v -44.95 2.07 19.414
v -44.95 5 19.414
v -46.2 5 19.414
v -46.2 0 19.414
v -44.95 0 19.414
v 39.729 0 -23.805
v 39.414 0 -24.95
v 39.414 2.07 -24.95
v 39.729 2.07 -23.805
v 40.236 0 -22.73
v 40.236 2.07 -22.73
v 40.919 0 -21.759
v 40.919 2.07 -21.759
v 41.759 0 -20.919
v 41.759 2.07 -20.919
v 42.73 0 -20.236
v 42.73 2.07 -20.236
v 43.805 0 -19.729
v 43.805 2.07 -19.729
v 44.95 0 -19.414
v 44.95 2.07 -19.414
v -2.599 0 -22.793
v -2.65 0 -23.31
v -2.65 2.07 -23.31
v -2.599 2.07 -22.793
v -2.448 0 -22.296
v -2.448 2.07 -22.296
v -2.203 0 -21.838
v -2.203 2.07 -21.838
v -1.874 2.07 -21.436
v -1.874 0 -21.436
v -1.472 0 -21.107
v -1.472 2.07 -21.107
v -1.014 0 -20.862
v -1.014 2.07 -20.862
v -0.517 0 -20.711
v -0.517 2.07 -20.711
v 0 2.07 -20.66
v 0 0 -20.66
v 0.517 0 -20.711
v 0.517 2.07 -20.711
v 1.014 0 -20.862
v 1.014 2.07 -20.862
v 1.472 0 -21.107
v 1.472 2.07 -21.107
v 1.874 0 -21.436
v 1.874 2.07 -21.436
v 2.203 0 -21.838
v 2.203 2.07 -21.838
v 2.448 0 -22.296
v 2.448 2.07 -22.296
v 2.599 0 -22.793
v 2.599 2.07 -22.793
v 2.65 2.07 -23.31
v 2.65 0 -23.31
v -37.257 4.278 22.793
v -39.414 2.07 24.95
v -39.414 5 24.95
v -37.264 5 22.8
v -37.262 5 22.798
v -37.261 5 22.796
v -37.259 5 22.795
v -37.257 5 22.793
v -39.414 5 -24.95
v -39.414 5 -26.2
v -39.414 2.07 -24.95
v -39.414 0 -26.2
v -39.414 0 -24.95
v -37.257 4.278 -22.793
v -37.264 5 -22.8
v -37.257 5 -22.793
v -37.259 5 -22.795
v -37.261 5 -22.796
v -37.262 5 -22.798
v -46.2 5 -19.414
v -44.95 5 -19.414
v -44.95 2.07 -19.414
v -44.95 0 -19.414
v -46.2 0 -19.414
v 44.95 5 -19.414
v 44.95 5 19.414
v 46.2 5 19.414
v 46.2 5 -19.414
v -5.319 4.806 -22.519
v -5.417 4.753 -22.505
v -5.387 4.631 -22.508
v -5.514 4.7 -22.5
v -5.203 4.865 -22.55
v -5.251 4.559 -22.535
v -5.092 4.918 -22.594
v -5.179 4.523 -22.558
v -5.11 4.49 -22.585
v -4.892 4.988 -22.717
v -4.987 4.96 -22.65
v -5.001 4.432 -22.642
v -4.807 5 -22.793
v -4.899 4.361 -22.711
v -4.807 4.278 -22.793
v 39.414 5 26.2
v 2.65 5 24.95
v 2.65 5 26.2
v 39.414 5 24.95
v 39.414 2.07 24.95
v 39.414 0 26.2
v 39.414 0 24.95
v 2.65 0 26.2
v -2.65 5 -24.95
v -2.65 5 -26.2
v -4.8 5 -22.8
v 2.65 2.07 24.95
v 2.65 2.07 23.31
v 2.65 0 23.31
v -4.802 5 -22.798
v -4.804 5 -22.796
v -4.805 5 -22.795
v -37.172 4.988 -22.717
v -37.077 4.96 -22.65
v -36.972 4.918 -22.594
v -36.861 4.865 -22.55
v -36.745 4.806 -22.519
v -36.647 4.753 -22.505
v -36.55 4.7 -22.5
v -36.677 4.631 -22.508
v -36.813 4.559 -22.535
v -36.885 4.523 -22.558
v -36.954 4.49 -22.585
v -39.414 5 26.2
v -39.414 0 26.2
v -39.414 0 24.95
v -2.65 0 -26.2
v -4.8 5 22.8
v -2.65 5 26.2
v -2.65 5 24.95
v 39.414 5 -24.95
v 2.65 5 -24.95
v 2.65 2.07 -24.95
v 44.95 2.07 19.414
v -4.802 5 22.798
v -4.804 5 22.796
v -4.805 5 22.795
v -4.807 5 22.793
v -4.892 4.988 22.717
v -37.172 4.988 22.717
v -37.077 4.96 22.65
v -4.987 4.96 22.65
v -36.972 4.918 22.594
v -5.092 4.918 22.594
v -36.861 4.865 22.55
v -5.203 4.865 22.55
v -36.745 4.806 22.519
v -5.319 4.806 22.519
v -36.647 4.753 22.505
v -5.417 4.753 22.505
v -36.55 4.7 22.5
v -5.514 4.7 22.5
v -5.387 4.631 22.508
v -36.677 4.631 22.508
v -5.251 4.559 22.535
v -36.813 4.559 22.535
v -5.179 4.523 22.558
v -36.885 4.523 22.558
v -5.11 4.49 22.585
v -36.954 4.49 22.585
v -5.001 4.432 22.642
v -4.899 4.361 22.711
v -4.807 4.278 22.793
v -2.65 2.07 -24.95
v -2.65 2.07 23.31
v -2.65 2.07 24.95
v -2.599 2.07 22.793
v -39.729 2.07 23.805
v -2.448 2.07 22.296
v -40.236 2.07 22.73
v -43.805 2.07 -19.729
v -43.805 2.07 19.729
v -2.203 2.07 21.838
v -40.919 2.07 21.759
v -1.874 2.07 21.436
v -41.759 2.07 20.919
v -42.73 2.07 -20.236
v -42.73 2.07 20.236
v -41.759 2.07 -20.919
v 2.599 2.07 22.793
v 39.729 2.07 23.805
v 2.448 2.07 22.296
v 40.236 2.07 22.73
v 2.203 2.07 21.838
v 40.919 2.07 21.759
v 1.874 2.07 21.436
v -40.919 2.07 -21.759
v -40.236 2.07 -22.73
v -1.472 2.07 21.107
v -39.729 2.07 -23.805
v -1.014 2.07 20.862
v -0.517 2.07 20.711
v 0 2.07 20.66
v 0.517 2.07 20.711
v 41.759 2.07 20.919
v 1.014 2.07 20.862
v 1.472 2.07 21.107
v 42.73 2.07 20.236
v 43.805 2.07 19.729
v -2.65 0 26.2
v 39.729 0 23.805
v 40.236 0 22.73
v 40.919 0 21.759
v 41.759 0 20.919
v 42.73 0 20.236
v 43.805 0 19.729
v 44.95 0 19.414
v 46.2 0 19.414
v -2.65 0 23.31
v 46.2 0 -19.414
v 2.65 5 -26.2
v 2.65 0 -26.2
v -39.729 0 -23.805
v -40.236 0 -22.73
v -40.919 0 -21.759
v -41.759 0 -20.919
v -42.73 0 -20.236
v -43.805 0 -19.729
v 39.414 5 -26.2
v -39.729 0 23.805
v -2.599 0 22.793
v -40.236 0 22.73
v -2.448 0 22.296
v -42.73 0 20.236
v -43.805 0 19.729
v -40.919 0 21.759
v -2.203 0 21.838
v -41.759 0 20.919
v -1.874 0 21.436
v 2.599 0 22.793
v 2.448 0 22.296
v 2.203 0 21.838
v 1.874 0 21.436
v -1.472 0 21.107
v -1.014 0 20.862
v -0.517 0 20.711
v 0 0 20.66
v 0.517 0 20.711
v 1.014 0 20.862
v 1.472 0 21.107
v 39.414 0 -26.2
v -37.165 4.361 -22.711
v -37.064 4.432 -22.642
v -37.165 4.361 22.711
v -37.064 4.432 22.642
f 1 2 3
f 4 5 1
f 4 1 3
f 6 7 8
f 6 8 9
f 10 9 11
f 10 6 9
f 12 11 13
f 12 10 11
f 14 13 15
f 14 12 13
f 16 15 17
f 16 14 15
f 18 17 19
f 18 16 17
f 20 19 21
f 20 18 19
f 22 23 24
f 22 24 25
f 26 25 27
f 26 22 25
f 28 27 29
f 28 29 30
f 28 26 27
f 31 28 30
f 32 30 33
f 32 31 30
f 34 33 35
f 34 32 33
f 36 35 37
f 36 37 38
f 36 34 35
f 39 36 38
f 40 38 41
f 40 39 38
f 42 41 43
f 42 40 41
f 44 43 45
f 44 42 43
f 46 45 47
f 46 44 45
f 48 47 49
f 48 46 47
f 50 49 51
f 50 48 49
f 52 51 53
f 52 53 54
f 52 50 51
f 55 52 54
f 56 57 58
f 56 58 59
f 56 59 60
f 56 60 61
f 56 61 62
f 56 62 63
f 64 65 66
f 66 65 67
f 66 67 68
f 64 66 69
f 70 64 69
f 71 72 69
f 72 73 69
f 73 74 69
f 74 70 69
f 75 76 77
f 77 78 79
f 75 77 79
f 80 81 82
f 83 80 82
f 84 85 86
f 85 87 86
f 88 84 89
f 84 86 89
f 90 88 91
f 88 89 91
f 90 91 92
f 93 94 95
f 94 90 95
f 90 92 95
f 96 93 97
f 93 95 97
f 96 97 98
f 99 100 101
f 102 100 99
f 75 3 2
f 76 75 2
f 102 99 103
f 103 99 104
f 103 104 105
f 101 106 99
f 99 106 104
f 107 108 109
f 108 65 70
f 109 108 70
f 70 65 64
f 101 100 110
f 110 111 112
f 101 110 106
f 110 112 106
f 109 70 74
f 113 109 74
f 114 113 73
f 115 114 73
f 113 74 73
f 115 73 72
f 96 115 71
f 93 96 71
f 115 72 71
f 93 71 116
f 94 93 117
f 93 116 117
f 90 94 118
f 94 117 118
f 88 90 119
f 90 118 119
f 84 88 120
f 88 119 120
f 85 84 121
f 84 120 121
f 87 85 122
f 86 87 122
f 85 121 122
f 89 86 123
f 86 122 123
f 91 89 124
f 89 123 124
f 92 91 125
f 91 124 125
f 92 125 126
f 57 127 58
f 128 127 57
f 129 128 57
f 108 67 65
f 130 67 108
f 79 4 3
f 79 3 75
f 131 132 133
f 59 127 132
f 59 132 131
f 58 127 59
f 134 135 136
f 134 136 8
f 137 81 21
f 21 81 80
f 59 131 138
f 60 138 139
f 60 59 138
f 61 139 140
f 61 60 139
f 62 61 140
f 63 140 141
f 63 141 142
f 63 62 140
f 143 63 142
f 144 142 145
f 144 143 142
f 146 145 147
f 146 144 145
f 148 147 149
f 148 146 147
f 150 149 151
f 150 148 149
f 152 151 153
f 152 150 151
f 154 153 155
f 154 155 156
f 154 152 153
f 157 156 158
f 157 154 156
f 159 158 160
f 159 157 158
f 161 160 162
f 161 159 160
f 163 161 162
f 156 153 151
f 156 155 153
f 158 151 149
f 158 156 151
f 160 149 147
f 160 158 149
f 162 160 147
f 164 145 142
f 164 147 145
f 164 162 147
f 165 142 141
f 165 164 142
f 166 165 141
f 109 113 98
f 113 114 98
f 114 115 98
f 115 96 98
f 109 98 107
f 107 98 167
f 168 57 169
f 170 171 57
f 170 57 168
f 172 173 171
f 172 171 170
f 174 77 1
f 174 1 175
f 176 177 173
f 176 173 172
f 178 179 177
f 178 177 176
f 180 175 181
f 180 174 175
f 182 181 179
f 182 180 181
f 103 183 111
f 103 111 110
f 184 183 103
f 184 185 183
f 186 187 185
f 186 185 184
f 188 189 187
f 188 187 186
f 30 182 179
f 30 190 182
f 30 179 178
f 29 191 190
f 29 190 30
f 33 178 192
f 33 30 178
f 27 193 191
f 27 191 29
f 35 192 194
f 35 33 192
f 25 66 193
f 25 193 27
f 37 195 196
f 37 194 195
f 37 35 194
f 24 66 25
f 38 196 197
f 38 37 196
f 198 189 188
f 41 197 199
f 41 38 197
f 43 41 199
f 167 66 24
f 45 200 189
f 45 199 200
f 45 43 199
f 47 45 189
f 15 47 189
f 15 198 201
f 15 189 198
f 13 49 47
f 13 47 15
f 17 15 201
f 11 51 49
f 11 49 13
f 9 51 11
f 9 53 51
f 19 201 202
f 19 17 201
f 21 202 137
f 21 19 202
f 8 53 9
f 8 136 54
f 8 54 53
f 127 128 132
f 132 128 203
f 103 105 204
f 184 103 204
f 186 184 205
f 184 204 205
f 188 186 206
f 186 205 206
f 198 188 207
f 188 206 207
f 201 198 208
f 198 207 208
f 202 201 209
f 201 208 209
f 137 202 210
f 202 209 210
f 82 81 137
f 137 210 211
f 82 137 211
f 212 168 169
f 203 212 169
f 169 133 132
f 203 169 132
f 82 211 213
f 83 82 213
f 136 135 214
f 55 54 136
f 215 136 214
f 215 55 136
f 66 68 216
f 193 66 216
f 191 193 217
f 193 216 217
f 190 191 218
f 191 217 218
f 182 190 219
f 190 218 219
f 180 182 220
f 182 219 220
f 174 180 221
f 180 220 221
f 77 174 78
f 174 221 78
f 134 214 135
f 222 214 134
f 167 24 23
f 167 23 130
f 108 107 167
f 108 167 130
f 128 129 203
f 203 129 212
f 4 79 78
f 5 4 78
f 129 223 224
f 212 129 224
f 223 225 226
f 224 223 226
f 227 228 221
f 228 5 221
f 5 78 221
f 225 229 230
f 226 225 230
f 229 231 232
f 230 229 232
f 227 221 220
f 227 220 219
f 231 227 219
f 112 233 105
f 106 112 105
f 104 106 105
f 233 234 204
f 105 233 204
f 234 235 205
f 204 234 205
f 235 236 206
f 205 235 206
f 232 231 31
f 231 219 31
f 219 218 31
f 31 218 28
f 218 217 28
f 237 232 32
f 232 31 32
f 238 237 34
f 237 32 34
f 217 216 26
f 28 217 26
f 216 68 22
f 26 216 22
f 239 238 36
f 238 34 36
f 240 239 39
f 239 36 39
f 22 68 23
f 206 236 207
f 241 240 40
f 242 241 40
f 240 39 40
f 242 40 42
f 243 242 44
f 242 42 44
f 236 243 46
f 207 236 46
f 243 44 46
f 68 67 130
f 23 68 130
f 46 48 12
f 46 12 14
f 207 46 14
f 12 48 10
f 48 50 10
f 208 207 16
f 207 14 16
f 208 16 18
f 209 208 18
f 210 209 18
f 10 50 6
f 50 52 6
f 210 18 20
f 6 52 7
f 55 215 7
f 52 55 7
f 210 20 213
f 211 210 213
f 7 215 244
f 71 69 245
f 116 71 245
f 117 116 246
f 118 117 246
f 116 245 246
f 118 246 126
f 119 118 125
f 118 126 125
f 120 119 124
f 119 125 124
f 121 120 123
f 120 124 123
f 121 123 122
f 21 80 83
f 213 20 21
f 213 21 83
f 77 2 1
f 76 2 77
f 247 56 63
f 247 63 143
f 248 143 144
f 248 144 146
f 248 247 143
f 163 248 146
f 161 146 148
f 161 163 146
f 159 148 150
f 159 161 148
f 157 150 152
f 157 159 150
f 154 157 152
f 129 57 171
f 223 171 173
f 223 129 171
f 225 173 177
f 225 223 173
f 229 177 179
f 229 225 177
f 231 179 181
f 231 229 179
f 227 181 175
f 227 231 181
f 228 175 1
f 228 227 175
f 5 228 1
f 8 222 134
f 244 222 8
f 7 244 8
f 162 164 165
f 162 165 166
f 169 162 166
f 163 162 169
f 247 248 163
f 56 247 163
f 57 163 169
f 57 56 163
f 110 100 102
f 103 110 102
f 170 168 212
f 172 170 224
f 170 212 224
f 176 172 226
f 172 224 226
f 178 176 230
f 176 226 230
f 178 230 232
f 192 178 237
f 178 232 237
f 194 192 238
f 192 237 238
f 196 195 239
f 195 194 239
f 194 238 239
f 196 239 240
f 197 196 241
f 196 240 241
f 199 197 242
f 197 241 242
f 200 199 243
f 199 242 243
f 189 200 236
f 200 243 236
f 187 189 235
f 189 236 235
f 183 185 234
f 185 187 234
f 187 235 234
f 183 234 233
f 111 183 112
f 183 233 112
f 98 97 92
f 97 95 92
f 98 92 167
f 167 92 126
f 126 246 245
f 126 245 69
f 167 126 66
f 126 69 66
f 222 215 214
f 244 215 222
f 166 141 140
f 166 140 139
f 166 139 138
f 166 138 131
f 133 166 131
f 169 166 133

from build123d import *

# Parameters (mm, degrees)
CROQUIS1_W              = 92.4
CROQUIS1_H              = 52.4
SALIENTE_EXTRUIR1_DEPTH = 5
CROQUIS2_W              = 89.9
CROQUIS2_H              = 49.9
CORTAR_EXTRUIR1_DEPTH   = 2.93
CORTAR_EXTRUIR2_START   = -2.07
CORTAR_EXTRUIR2_DEPTH   = 5
CORTAR_EXTRUIR3_START   = -2.07
CORTAR_EXTRUIR3_DEPTH   = 5
SIMETR_A2_START         = -2.07
SIMETR_A2_COPY_1_DEPTH  = 5
SALIENTE_EXTRUIR3_START = -36.764169
SALIENTE_EXTRUIR3_DEPTH = 36.764169
CORTAR_EXTRUIR5_REACH   = 55.193


with BuildPart() as part:
    # Croquis1 → Saliente-Extruir1 (new body)
    with BuildSketch(Plane(origin=(0, 0, 0), x_dir=(1, 0, 0), z_dir=(0, 1, 0))):
        Rectangle(CROQUIS1_W, CROQUIS1_H)
    extrude(amount=SALIENTE_EXTRUIR1_DEPTH)

    # Croquis2 → Cortar-Extruir1 (cut)
    with BuildSketch(Plane(origin=(0, 5, 0), x_dir=(1, 0, 0), z_dir=(0, 1, 0))):
        Rectangle(CROQUIS2_W, CROQUIS2_H)
    extrude(amount=-CORTAR_EXTRUIR1_DEPTH, mode=Mode.SUBTRACT)

    # Croquis3 → Cortar-Extruir2 (cut)
    with BuildSketch(Plane(origin=(0, 2.07, 0), x_dir=(1, 0, 0), z_dir=(0, 1, 0)).offset(CORTAR_EXTRUIR2_START)):
        with BuildLine():
            Line((2.65, -23.31), (2.65, -26.2))
            Line((2.65, -26.2), (-2.65, -26.2))
            Line((-2.65, -26.2), (-2.65, -23.31))
            ThreePointArc((-2.65, -23.31), (0, -20.66), (2.65, -23.31))
        make_face()
    cortar_extruir2 = extrude(amount=CORTAR_EXTRUIR2_DEPTH, mode=Mode.SUBTRACT)

    # Croquis4 → Cortar-Extruir3 (cut)
    with BuildSketch(Plane(origin=(0, 2.07, 0), x_dir=(1, 0, 0), z_dir=(0, 1, 0)).offset(CORTAR_EXTRUIR3_START)):
        with BuildLine():
            Line((-46.2, -19.414169174), (-46.2, -26.2))
            Line((-46.2, -26.2), (-39.414169174, -26.2))
            Line((-39.414169174, -26.2), (-39.414169174, -24.95))
            ThreePointArc((-39.414169174, -24.95), (-41.32096321, -21.32096321), (-44.95, -19.414169174))
            Line((-44.95, -19.414169174), (-46.2, -19.414169174))
        make_face()
    cortar_extruir3 = extrude(amount=CORTAR_EXTRUIR3_DEPTH, mode=Mode.SUBTRACT)

    # Simetría1: Cortar-Extruir3 across plane
    add(cortar_extruir3.mirror(Plane(origin=(0, 0, 0), x_dir=(0, 0, 1), z_dir=(1, 0, 0))), mode=Mode.SUBTRACT)

    # Simetría2: Cortar-Extruir3 across plane
    add(cortar_extruir3.mirror(Plane.XY), mode=Mode.SUBTRACT)

    # Simetría2 copy 1 sketch → Simetría2 copy 1 (cut)
    with BuildSketch(Plane(origin=(0, 2.07, 0), x_dir=(-1, 0, 0), z_dir=(0, 1, 0)).offset(SIMETR_A2_START)):
        with BuildLine():
            Line((-46.2, -19.414169174), (-46.2, -26.2))
            Line((-46.2, -26.2), (-39.414169174, -26.2))
            Line((-39.414169174, -26.2), (-39.414169174, -24.95))
            ThreePointArc((-39.414169174, -24.95), (-41.32096321, -21.32096321), (-44.95, -19.414169174))
            Line((-44.95, -19.414169174), (-46.2, -19.414169174))
        make_face()
    extrude(amount=SIMETR_A2_COPY_1_DEPTH, mode=Mode.SUBTRACT)

    # Simetría3: Cortar-Extruir2 across plane
    add(cortar_extruir2.mirror(Plane.XY), mode=Mode.SUBTRACT)

    # Croquis7 → Saliente-Extruir3 (add)
    with BuildSketch(Plane(origin=(-2.65, 0, 0), x_dir=(0, 0, -1), z_dir=(1, 0, 0)).offset(SALIENTE_EXTRUIR3_START)):
        with BuildLine():
            Line((-24.95, 2.07), (-24.95, 5))
            Line((-24.95, 5), (-22.8, 5))
            ThreePointArc((-22.8, 5), (-22.523509792, 4.816418061), (-22.585410307, 4.490354433))
            Line((-22.585410307, 4.490354433), (-24.95, 2.07))
        make_face()
    saliente_extruir3 = extrude(amount=SALIENTE_EXTRUIR3_DEPTH)

    # Cortar-Extruir5: up to this face of the body (flat: up to its plane)
    cortar_extruir5_end = Plane(part.part.faces().sort_by_distance((21.032084587, 5, 25.575))[0])
    # Croquis8 → Cortar-Extruir5 (cut, up to the picked face)
    with BuildSketch(Plane(origin=(0, 2.07, 0), x_dir=(1, 0, 0), z_dir=(0, 1, 0)), mode=Mode.PRIVATE) as cortar_extruir5_sk1:
        with BuildLine():
            Line((-39.414169174, -24.95), (-37.257062393, -22.792893219))
            ThreePointArc((-37.257062393, -22.792893219), (-36.932639044, -22.576120467), (-36.549955612, -22.5))
            Line((-36.549955612, -22.5), (-5.514213562, -22.5))
            ThreePointArc((-5.514213562, -22.5), (-5.13153013, -22.576120467), (-4.807106781, -22.792893219))
            Line((-4.807106781, -22.792893219), (-2.65, -24.95))
            Line((-2.65, -24.95), (-1.683524182, -24.95))
            Line((-1.683524182, -24.95), (-1.683524182, -18.227572619))
            Line((-1.683524182, -18.227572619), (-40.735830346, -18.227572619))
            Line((-40.735830346, -18.227572619), (-40.735830346, -24.95))
            Line((-40.735830346, -24.95), (-39.414169174, -24.95))
        make_face()
    cortar_extruir5_tool1 = split(extrude(cortar_extruir5_sk1.sketch, amount=CORTAR_EXTRUIR5_REACH, mode=Mode.PRIVATE), bisect_by=cortar_extruir5_end, keep=Keep.BOTH, mode=Mode.PRIVATE)
    cortar_extruir5 = cortar_extruir5_tool1.solids().sort_by(Axis((-21.293277, 2.07, 20.569176), (0, 1, 0)))[0]
    add(cortar_extruir5, mode=Mode.SUBTRACT)

    # Simetría4: Saliente-Extruir3, Cortar-Extruir5 across plane
    add(saliente_extruir3.mirror(Plane.XY))
    add(cortar_extruir5.mirror(Plane.XY), mode=Mode.SUBTRACT)


solid = part.part
